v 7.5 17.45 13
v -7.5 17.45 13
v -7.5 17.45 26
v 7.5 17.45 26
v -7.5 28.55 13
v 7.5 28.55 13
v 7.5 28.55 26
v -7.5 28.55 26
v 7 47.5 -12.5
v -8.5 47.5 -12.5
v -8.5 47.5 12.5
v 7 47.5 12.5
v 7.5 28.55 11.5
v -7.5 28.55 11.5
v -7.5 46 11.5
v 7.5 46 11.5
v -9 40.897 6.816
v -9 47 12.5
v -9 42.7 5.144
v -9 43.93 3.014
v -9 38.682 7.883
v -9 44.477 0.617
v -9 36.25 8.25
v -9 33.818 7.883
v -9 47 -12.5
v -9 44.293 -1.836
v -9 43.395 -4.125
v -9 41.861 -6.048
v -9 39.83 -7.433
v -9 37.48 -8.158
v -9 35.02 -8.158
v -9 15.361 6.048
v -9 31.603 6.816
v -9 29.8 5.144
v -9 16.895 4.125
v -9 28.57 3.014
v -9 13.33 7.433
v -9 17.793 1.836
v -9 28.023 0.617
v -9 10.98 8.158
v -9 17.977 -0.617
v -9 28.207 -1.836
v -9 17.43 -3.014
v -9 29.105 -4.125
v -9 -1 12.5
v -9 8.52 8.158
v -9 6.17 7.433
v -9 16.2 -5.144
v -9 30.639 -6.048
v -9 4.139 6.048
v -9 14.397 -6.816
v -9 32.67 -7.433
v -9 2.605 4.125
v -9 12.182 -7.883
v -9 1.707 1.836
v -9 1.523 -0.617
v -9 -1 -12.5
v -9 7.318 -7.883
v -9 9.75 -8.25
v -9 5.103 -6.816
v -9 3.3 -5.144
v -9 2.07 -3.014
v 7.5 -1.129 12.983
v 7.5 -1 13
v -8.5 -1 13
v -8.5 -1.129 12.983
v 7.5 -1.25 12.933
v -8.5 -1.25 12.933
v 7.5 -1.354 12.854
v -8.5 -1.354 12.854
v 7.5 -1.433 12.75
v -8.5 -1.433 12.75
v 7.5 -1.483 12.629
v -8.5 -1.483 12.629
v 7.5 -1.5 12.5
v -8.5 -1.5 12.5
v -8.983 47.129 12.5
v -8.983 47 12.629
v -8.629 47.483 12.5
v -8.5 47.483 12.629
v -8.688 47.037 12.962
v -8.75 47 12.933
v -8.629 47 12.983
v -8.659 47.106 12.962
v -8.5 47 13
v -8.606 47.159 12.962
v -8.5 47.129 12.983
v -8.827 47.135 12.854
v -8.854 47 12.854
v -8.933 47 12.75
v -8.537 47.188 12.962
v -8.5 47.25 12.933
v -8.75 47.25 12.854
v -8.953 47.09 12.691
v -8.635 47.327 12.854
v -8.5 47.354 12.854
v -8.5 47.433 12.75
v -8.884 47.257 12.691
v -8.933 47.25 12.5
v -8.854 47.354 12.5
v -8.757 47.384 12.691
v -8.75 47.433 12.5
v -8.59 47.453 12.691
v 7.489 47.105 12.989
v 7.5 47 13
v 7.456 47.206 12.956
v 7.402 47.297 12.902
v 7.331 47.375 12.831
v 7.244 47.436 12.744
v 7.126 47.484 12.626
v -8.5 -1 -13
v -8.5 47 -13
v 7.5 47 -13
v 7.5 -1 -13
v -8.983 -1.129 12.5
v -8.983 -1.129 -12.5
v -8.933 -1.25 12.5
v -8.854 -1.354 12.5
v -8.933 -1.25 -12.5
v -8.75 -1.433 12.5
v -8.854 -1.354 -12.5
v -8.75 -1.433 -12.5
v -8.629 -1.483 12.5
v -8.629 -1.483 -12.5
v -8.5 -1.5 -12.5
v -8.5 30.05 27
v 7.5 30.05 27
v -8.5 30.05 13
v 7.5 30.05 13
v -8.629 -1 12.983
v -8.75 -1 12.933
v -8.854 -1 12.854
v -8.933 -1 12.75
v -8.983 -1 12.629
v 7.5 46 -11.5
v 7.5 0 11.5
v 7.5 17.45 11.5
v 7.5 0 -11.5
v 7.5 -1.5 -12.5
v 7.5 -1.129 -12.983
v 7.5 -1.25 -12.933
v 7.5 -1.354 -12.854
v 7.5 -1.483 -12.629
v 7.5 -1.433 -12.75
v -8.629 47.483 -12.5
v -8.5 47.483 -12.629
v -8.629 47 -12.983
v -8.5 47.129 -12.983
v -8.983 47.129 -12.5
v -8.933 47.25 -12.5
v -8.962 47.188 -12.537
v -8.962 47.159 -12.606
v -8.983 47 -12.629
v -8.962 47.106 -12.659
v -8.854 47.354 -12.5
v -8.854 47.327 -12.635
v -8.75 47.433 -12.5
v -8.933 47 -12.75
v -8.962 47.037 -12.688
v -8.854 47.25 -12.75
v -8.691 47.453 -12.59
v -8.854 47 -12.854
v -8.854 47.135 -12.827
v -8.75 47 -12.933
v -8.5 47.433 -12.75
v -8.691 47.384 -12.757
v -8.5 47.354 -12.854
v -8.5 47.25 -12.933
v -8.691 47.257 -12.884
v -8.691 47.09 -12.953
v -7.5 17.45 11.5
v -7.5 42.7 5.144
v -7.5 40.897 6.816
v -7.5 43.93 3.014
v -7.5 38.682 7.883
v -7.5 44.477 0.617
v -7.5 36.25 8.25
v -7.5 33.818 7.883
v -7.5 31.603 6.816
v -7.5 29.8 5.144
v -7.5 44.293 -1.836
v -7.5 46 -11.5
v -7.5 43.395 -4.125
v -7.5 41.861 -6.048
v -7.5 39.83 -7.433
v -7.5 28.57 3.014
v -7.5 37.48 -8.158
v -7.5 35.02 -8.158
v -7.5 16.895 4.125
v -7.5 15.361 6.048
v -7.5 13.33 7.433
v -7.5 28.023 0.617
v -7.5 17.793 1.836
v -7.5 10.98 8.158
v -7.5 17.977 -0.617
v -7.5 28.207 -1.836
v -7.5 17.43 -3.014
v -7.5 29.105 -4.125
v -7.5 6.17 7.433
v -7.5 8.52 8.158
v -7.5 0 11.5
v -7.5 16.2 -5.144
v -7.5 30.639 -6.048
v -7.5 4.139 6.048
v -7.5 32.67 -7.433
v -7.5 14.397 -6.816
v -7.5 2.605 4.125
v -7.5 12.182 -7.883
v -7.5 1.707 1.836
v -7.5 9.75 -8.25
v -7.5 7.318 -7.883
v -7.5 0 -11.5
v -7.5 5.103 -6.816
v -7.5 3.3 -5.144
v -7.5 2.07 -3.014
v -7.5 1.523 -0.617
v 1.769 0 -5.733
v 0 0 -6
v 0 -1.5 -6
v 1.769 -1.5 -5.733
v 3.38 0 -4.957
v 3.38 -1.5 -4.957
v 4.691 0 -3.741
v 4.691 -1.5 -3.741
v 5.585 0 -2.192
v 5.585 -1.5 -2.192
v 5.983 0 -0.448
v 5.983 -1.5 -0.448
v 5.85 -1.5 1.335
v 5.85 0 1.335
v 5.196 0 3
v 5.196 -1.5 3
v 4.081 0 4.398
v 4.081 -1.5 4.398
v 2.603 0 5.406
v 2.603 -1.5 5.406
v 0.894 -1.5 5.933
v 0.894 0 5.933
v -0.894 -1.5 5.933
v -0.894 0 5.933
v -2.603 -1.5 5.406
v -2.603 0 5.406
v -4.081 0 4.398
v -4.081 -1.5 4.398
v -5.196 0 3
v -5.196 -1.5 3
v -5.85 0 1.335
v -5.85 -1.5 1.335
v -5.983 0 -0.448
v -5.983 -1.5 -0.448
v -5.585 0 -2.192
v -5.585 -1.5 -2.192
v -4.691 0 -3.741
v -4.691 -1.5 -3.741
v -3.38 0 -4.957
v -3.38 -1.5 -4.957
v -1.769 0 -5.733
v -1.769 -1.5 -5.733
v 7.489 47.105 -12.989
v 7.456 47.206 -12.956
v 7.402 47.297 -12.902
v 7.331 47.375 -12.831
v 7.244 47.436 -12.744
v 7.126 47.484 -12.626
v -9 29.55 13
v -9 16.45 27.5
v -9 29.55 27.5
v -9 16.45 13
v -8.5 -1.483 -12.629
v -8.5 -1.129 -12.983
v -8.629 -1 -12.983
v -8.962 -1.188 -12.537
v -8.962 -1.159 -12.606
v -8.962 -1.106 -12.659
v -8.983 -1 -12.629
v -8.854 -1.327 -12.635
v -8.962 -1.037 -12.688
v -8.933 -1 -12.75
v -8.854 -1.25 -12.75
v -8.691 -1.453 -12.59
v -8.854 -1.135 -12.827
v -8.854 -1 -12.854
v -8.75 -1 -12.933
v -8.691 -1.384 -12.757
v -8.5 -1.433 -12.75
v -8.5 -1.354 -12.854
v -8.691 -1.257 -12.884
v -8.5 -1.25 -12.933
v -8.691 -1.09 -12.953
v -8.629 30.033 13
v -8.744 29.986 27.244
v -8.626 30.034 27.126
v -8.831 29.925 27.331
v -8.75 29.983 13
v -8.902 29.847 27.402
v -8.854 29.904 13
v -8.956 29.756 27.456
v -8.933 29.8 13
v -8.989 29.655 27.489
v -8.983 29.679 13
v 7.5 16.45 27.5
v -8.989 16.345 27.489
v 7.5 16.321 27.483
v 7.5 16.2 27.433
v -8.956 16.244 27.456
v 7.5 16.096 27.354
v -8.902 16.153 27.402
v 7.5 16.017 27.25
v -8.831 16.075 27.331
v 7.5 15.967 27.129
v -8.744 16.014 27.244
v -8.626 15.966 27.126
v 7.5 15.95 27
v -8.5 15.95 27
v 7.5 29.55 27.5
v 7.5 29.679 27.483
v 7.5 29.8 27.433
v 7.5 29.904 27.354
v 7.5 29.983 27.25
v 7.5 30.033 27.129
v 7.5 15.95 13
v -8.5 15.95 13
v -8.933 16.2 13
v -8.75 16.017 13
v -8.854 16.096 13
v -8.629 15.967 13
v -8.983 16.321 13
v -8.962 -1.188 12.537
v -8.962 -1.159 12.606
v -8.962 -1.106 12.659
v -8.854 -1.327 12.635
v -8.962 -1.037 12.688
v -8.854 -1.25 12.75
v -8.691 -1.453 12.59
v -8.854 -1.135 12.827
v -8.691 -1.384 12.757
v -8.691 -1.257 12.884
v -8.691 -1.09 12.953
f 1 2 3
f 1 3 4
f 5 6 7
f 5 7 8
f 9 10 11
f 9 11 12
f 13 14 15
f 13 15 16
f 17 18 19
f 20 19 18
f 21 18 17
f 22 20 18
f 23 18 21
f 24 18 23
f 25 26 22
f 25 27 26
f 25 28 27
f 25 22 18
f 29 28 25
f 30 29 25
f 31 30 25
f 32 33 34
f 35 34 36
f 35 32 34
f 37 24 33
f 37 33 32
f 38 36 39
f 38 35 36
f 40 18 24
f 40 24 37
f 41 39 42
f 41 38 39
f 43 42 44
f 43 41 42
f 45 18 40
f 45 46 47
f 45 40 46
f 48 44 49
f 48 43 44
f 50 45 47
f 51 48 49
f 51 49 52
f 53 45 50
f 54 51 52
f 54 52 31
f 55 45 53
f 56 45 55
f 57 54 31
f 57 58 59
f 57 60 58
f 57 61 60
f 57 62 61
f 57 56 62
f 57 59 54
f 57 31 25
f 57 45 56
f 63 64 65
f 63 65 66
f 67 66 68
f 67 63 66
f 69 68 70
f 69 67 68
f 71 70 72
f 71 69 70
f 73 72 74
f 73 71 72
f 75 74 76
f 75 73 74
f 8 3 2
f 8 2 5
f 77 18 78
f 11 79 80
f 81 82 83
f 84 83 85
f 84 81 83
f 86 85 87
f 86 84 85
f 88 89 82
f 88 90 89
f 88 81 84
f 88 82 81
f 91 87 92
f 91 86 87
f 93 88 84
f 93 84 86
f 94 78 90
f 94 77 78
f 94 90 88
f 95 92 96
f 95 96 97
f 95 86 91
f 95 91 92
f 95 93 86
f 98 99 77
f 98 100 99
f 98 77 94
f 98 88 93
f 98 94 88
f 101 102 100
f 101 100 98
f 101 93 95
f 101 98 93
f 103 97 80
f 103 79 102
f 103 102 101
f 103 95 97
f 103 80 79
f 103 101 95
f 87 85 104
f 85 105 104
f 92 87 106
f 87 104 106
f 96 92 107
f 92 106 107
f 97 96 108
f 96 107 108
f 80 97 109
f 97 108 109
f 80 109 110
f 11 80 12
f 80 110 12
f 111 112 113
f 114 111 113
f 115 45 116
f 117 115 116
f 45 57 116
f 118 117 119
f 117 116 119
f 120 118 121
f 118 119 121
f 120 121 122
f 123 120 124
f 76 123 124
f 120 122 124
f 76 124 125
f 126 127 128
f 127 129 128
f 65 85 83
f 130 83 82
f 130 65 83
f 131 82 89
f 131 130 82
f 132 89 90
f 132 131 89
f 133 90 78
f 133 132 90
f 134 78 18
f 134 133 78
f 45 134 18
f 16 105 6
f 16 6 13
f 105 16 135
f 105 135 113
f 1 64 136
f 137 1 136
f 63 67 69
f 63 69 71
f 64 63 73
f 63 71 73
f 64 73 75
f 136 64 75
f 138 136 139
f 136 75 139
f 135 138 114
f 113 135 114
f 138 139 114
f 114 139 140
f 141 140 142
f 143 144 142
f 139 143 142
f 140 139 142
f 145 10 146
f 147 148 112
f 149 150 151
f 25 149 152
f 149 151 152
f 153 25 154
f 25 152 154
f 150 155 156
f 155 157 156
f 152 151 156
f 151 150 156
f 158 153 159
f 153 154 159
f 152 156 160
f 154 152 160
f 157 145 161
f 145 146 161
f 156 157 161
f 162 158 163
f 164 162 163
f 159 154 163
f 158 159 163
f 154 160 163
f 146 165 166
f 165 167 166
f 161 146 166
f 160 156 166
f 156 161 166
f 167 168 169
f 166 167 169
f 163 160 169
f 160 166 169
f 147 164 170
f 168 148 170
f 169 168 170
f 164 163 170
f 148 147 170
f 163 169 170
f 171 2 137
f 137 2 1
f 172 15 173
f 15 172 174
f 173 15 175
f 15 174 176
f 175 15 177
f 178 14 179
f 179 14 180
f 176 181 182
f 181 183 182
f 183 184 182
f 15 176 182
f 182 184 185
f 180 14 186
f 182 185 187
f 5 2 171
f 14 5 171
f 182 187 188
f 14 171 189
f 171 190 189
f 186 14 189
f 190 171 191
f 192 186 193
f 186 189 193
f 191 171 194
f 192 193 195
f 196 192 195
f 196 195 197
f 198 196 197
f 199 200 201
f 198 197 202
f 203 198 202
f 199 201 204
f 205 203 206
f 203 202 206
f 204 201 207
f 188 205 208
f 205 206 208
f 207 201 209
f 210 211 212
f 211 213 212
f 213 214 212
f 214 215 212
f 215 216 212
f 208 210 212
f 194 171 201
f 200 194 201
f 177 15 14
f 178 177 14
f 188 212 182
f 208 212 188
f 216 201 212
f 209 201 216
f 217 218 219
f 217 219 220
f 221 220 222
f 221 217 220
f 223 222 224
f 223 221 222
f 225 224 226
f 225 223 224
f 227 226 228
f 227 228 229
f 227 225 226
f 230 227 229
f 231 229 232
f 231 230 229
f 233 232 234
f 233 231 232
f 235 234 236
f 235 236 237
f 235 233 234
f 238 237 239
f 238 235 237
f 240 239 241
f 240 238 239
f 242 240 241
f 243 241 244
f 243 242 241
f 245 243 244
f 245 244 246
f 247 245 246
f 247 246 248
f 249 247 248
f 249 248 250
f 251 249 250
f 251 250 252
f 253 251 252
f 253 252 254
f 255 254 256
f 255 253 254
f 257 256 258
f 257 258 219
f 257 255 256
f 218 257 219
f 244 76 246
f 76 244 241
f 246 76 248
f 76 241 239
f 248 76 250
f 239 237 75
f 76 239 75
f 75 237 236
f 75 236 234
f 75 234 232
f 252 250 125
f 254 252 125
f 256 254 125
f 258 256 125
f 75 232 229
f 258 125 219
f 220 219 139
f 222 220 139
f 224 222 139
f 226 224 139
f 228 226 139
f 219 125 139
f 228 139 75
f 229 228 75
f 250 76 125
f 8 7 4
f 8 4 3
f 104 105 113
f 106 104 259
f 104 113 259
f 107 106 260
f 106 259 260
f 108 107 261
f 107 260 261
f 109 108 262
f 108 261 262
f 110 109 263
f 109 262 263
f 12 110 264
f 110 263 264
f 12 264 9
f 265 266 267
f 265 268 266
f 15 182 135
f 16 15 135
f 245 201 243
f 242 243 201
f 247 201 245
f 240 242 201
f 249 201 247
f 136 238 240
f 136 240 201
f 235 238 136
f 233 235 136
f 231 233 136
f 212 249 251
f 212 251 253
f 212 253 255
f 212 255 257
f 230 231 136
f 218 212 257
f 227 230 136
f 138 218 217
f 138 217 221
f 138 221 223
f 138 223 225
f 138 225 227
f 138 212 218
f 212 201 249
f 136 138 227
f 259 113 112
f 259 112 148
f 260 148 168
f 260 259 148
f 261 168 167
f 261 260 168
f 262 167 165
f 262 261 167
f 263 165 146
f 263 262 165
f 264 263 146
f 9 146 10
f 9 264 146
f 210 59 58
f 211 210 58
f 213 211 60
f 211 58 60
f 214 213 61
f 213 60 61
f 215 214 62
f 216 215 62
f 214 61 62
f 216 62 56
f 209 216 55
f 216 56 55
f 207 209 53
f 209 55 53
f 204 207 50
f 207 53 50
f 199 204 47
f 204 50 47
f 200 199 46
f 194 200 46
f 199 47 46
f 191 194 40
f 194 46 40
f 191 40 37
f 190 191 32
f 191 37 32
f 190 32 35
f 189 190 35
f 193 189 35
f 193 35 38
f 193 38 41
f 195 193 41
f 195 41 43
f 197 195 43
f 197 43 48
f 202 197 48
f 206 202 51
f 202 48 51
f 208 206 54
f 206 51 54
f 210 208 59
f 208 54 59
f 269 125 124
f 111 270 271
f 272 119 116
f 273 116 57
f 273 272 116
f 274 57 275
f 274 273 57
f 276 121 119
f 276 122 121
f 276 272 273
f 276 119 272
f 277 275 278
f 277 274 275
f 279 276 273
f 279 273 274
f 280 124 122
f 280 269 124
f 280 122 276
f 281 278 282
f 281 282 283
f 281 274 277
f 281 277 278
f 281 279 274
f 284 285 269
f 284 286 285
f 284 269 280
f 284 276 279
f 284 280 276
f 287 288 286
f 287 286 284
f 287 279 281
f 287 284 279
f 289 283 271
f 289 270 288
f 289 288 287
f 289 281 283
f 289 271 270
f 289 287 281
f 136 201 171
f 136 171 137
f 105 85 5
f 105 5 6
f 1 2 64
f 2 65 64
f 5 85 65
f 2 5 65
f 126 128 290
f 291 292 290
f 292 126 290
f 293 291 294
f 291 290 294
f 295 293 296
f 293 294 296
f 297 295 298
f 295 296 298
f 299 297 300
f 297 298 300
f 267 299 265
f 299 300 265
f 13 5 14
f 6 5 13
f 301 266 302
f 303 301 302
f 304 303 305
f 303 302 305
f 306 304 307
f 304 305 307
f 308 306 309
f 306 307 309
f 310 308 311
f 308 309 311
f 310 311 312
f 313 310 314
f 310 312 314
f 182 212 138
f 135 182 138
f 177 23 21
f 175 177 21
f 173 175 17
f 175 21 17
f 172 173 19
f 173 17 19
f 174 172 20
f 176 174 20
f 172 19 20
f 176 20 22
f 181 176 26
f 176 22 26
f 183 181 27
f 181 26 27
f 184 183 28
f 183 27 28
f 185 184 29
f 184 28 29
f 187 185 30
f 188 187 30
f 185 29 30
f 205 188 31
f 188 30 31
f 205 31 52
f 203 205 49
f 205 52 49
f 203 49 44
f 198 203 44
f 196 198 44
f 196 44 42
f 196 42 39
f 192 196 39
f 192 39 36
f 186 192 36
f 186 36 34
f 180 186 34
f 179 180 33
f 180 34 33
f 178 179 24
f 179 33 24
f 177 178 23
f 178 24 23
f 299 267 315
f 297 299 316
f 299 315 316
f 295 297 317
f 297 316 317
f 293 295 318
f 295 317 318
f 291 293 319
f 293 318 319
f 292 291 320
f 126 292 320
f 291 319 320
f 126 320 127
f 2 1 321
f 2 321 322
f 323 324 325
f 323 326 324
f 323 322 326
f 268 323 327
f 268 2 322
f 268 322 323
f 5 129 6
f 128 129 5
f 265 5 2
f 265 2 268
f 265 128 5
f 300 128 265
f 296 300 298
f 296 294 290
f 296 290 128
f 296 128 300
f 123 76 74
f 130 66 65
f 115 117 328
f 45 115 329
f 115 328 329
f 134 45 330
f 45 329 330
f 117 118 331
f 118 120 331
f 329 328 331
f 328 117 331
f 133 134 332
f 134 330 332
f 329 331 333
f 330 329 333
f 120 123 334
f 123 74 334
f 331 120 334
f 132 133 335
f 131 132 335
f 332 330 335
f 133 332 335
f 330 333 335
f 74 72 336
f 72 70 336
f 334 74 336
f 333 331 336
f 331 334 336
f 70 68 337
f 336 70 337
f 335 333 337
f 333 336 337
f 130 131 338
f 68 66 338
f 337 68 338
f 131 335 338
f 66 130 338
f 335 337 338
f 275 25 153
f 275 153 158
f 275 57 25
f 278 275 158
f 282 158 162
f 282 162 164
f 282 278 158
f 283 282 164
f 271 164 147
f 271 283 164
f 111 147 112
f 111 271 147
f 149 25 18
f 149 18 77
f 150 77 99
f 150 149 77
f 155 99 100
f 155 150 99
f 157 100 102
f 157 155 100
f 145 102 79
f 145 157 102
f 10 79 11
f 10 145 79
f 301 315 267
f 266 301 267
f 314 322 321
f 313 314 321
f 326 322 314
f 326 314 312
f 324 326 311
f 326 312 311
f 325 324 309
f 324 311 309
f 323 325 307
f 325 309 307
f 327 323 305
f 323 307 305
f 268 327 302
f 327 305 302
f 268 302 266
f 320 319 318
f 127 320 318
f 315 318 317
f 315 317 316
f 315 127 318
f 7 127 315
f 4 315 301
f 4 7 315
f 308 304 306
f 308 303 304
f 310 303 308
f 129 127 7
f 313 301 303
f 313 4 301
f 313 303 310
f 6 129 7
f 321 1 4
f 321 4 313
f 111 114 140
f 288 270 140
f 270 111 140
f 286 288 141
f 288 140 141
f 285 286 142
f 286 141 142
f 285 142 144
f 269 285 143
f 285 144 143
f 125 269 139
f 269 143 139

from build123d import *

# Parameters (mm, degrees)
SKETCH_1_W          = 15
SKETCH_1_H          = 23
EXTRUDE_1_DEPTH     = 46
SHELL_1_T           = 1.5
SKETCH_2_R          = 6
CUT_EXTRUDE_4_DEPTH = 1.5
SKETCH_3_R          = 8.25
CUT_EXTRUDE_5_DEPTH = 1.5
SKETCH_4_W          = 13.5
SKETCH_4_H          = 11.1
CUT_EXTRUDE_6_DEPTH = 10
EXTRUDE_2_DEPTH     = 13
SHELL_2_T           = 1.5
FILLET_3_R          = 0.5
SKETCH_7_W          = 1.5
SKETCH_7_H          = 11.1
CUT_EXTRUDE_7_DEPTH = 1.5
FILLET_4_R          = 0.5


with BuildPart() as part:
    # 草图1 → 凸台-拉伸1 (new body)
    with BuildSketch(Plane(origin=(0, 0, 0), x_dir=(1, 0, 0), z_dir=(0, 1, 0))):
        Rectangle(SKETCH_1_W, SKETCH_1_H)
    extrude(amount=EXTRUDE_1_DEPTH)

    # 抽壳1
    shell_1_openings = [part.faces().sort_by_distance(p)[0] for p in [
        (7.5, 23, 0),
    ]]
    offset(amount=SHELL_1_T, openings=shell_1_openings, kind=Kind.INTERSECTION)

    # 草图2 → 切除-拉伸4 (cut)
    with BuildSketch(Plane(origin=(0, 0, 0), x_dir=(-1, 0, 0), z_dir=(0, -1, 0))):
        with Locations(Location((0, 0, 0), (0, 0, 90))):
            Circle(SKETCH_2_R)
    extrude(amount=CUT_EXTRUDE_4_DEPTH, mode=Mode.SUBTRACT)

    # 草图3 → 切除-拉伸5 (cut)
    with BuildSketch(Plane.ZY.offset(9)):
        with Locations((0, 36.25)):
            Circle(SKETCH_3_R)
        with Locations(Location((0, 9.75, 0), (0, 0, 180))):
            Circle(SKETCH_3_R)
    extrude(amount=-CUT_EXTRUDE_5_DEPTH, mode=Mode.SUBTRACT)

    # 草图4 → 切除-拉伸6 (cut)
    with BuildSketch(Plane(origin=(0, 0, 11.5), x_dir=(-1, 0, 0), z_dir=(0, 0, -1))):
        with Locations((0.75, 23)):
            Rectangle(SKETCH_4_W, SKETCH_4_H)
    extrude(amount=-CUT_EXTRUDE_6_DEPTH, mode=Mode.SUBTRACT)

    # 圆角3
    fillet_3_edges = [part.edges().sort_by_distance(p)[0] for p in [
        (7.5, 47.5, 0),
        (-0.75, 47.5, -13),
        (-9, 47.5, 0),
        (-0.75, -1.5, -13),
        (-0.75, -1.5, 13),
        (-9, -1.5, 0),
        (-9, 23, -13),
        (-9, 23, 13),
        (-0.75, 47.5, 13),
    ]]
    fillet(fillet_3_edges, radius=FILLET_3_R)

    # 草图7 → 切除-拉伸7 (cut)
    with BuildSketch(Plane.XY.offset(13)):
        with Locations((6.75, 23)):
            Rectangle(SKETCH_7_W, SKETCH_7_H)
    extrude(amount=-CUT_EXTRUDE_7_DEPTH, mode=Mode.SUBTRACT)


with BuildPart() as body_2:
    # 草图5 → 凸台-拉伸2 (new body)
    with BuildSketch(Plane.XY.offset(13)):
        Polygon((-7.5, 28.55), (6, 28.55), (7.5, 28.55), (7.5, 17.45), (6, 17.45), (-7.5, 17.45), align=None)
    extrude(amount=EXTRUDE_2_DEPTH)

    # 抽壳2
    shell_2_openings = [body_2.faces().sort_by_distance(p)[0] for p in [
        (0, 23, 13),
        (7.5, 23, 19.5),
    ]]
    offset(amount=SHELL_2_T, openings=shell_2_openings, kind=Kind.INTERSECTION)

    # 圆角4
    # the kernel refuses this fillet: 0.5 mm, written as the material it takes off along each edge
    with BuildSketch(Plane(origin=(-9, 30.05, 11.75), x_dir=(1, 0, 0), z_dir=(0, 0, 1)), Plane(origin=(-9, 15.95, 28.75), x_dir=(1, 0, 0), z_dir=(0, 0, -1))) as fillet_4_piece_1:
        with BuildLine():
            CenterArc((FILLET_4_R, -FILLET_4_R), FILLET_4_R, 90, 90)
            Line((0, -FILLET_4_R), (0, 0))
            Line((0, 0), (FILLET_4_R, 0))
        make_face()
    extrude(amount=17, mode=Mode.SUBTRACT)
    with BuildSketch(Plane(origin=(8.75, 30.05, 27.5), x_dir=(0, 0, -1), z_dir=(-1, 0, 0)), Plane(origin=(-10.25, 15.95, 27.5), x_dir=(0, 0, -1), z_dir=(1, 0, 0))) as fillet_4_piece_2:
        with BuildLine():
            CenterArc((FILLET_4_R, FILLET_4_R), FILLET_4_R, 180, 90)
            Line((0, FILLET_4_R), (0, 0))
            Line((0, 0), (FILLET_4_R, 0))
        make_face()
    extrude(amount=19, mode=Mode.SUBTRACT)


solid = Compound([part.part, body_2.part])
